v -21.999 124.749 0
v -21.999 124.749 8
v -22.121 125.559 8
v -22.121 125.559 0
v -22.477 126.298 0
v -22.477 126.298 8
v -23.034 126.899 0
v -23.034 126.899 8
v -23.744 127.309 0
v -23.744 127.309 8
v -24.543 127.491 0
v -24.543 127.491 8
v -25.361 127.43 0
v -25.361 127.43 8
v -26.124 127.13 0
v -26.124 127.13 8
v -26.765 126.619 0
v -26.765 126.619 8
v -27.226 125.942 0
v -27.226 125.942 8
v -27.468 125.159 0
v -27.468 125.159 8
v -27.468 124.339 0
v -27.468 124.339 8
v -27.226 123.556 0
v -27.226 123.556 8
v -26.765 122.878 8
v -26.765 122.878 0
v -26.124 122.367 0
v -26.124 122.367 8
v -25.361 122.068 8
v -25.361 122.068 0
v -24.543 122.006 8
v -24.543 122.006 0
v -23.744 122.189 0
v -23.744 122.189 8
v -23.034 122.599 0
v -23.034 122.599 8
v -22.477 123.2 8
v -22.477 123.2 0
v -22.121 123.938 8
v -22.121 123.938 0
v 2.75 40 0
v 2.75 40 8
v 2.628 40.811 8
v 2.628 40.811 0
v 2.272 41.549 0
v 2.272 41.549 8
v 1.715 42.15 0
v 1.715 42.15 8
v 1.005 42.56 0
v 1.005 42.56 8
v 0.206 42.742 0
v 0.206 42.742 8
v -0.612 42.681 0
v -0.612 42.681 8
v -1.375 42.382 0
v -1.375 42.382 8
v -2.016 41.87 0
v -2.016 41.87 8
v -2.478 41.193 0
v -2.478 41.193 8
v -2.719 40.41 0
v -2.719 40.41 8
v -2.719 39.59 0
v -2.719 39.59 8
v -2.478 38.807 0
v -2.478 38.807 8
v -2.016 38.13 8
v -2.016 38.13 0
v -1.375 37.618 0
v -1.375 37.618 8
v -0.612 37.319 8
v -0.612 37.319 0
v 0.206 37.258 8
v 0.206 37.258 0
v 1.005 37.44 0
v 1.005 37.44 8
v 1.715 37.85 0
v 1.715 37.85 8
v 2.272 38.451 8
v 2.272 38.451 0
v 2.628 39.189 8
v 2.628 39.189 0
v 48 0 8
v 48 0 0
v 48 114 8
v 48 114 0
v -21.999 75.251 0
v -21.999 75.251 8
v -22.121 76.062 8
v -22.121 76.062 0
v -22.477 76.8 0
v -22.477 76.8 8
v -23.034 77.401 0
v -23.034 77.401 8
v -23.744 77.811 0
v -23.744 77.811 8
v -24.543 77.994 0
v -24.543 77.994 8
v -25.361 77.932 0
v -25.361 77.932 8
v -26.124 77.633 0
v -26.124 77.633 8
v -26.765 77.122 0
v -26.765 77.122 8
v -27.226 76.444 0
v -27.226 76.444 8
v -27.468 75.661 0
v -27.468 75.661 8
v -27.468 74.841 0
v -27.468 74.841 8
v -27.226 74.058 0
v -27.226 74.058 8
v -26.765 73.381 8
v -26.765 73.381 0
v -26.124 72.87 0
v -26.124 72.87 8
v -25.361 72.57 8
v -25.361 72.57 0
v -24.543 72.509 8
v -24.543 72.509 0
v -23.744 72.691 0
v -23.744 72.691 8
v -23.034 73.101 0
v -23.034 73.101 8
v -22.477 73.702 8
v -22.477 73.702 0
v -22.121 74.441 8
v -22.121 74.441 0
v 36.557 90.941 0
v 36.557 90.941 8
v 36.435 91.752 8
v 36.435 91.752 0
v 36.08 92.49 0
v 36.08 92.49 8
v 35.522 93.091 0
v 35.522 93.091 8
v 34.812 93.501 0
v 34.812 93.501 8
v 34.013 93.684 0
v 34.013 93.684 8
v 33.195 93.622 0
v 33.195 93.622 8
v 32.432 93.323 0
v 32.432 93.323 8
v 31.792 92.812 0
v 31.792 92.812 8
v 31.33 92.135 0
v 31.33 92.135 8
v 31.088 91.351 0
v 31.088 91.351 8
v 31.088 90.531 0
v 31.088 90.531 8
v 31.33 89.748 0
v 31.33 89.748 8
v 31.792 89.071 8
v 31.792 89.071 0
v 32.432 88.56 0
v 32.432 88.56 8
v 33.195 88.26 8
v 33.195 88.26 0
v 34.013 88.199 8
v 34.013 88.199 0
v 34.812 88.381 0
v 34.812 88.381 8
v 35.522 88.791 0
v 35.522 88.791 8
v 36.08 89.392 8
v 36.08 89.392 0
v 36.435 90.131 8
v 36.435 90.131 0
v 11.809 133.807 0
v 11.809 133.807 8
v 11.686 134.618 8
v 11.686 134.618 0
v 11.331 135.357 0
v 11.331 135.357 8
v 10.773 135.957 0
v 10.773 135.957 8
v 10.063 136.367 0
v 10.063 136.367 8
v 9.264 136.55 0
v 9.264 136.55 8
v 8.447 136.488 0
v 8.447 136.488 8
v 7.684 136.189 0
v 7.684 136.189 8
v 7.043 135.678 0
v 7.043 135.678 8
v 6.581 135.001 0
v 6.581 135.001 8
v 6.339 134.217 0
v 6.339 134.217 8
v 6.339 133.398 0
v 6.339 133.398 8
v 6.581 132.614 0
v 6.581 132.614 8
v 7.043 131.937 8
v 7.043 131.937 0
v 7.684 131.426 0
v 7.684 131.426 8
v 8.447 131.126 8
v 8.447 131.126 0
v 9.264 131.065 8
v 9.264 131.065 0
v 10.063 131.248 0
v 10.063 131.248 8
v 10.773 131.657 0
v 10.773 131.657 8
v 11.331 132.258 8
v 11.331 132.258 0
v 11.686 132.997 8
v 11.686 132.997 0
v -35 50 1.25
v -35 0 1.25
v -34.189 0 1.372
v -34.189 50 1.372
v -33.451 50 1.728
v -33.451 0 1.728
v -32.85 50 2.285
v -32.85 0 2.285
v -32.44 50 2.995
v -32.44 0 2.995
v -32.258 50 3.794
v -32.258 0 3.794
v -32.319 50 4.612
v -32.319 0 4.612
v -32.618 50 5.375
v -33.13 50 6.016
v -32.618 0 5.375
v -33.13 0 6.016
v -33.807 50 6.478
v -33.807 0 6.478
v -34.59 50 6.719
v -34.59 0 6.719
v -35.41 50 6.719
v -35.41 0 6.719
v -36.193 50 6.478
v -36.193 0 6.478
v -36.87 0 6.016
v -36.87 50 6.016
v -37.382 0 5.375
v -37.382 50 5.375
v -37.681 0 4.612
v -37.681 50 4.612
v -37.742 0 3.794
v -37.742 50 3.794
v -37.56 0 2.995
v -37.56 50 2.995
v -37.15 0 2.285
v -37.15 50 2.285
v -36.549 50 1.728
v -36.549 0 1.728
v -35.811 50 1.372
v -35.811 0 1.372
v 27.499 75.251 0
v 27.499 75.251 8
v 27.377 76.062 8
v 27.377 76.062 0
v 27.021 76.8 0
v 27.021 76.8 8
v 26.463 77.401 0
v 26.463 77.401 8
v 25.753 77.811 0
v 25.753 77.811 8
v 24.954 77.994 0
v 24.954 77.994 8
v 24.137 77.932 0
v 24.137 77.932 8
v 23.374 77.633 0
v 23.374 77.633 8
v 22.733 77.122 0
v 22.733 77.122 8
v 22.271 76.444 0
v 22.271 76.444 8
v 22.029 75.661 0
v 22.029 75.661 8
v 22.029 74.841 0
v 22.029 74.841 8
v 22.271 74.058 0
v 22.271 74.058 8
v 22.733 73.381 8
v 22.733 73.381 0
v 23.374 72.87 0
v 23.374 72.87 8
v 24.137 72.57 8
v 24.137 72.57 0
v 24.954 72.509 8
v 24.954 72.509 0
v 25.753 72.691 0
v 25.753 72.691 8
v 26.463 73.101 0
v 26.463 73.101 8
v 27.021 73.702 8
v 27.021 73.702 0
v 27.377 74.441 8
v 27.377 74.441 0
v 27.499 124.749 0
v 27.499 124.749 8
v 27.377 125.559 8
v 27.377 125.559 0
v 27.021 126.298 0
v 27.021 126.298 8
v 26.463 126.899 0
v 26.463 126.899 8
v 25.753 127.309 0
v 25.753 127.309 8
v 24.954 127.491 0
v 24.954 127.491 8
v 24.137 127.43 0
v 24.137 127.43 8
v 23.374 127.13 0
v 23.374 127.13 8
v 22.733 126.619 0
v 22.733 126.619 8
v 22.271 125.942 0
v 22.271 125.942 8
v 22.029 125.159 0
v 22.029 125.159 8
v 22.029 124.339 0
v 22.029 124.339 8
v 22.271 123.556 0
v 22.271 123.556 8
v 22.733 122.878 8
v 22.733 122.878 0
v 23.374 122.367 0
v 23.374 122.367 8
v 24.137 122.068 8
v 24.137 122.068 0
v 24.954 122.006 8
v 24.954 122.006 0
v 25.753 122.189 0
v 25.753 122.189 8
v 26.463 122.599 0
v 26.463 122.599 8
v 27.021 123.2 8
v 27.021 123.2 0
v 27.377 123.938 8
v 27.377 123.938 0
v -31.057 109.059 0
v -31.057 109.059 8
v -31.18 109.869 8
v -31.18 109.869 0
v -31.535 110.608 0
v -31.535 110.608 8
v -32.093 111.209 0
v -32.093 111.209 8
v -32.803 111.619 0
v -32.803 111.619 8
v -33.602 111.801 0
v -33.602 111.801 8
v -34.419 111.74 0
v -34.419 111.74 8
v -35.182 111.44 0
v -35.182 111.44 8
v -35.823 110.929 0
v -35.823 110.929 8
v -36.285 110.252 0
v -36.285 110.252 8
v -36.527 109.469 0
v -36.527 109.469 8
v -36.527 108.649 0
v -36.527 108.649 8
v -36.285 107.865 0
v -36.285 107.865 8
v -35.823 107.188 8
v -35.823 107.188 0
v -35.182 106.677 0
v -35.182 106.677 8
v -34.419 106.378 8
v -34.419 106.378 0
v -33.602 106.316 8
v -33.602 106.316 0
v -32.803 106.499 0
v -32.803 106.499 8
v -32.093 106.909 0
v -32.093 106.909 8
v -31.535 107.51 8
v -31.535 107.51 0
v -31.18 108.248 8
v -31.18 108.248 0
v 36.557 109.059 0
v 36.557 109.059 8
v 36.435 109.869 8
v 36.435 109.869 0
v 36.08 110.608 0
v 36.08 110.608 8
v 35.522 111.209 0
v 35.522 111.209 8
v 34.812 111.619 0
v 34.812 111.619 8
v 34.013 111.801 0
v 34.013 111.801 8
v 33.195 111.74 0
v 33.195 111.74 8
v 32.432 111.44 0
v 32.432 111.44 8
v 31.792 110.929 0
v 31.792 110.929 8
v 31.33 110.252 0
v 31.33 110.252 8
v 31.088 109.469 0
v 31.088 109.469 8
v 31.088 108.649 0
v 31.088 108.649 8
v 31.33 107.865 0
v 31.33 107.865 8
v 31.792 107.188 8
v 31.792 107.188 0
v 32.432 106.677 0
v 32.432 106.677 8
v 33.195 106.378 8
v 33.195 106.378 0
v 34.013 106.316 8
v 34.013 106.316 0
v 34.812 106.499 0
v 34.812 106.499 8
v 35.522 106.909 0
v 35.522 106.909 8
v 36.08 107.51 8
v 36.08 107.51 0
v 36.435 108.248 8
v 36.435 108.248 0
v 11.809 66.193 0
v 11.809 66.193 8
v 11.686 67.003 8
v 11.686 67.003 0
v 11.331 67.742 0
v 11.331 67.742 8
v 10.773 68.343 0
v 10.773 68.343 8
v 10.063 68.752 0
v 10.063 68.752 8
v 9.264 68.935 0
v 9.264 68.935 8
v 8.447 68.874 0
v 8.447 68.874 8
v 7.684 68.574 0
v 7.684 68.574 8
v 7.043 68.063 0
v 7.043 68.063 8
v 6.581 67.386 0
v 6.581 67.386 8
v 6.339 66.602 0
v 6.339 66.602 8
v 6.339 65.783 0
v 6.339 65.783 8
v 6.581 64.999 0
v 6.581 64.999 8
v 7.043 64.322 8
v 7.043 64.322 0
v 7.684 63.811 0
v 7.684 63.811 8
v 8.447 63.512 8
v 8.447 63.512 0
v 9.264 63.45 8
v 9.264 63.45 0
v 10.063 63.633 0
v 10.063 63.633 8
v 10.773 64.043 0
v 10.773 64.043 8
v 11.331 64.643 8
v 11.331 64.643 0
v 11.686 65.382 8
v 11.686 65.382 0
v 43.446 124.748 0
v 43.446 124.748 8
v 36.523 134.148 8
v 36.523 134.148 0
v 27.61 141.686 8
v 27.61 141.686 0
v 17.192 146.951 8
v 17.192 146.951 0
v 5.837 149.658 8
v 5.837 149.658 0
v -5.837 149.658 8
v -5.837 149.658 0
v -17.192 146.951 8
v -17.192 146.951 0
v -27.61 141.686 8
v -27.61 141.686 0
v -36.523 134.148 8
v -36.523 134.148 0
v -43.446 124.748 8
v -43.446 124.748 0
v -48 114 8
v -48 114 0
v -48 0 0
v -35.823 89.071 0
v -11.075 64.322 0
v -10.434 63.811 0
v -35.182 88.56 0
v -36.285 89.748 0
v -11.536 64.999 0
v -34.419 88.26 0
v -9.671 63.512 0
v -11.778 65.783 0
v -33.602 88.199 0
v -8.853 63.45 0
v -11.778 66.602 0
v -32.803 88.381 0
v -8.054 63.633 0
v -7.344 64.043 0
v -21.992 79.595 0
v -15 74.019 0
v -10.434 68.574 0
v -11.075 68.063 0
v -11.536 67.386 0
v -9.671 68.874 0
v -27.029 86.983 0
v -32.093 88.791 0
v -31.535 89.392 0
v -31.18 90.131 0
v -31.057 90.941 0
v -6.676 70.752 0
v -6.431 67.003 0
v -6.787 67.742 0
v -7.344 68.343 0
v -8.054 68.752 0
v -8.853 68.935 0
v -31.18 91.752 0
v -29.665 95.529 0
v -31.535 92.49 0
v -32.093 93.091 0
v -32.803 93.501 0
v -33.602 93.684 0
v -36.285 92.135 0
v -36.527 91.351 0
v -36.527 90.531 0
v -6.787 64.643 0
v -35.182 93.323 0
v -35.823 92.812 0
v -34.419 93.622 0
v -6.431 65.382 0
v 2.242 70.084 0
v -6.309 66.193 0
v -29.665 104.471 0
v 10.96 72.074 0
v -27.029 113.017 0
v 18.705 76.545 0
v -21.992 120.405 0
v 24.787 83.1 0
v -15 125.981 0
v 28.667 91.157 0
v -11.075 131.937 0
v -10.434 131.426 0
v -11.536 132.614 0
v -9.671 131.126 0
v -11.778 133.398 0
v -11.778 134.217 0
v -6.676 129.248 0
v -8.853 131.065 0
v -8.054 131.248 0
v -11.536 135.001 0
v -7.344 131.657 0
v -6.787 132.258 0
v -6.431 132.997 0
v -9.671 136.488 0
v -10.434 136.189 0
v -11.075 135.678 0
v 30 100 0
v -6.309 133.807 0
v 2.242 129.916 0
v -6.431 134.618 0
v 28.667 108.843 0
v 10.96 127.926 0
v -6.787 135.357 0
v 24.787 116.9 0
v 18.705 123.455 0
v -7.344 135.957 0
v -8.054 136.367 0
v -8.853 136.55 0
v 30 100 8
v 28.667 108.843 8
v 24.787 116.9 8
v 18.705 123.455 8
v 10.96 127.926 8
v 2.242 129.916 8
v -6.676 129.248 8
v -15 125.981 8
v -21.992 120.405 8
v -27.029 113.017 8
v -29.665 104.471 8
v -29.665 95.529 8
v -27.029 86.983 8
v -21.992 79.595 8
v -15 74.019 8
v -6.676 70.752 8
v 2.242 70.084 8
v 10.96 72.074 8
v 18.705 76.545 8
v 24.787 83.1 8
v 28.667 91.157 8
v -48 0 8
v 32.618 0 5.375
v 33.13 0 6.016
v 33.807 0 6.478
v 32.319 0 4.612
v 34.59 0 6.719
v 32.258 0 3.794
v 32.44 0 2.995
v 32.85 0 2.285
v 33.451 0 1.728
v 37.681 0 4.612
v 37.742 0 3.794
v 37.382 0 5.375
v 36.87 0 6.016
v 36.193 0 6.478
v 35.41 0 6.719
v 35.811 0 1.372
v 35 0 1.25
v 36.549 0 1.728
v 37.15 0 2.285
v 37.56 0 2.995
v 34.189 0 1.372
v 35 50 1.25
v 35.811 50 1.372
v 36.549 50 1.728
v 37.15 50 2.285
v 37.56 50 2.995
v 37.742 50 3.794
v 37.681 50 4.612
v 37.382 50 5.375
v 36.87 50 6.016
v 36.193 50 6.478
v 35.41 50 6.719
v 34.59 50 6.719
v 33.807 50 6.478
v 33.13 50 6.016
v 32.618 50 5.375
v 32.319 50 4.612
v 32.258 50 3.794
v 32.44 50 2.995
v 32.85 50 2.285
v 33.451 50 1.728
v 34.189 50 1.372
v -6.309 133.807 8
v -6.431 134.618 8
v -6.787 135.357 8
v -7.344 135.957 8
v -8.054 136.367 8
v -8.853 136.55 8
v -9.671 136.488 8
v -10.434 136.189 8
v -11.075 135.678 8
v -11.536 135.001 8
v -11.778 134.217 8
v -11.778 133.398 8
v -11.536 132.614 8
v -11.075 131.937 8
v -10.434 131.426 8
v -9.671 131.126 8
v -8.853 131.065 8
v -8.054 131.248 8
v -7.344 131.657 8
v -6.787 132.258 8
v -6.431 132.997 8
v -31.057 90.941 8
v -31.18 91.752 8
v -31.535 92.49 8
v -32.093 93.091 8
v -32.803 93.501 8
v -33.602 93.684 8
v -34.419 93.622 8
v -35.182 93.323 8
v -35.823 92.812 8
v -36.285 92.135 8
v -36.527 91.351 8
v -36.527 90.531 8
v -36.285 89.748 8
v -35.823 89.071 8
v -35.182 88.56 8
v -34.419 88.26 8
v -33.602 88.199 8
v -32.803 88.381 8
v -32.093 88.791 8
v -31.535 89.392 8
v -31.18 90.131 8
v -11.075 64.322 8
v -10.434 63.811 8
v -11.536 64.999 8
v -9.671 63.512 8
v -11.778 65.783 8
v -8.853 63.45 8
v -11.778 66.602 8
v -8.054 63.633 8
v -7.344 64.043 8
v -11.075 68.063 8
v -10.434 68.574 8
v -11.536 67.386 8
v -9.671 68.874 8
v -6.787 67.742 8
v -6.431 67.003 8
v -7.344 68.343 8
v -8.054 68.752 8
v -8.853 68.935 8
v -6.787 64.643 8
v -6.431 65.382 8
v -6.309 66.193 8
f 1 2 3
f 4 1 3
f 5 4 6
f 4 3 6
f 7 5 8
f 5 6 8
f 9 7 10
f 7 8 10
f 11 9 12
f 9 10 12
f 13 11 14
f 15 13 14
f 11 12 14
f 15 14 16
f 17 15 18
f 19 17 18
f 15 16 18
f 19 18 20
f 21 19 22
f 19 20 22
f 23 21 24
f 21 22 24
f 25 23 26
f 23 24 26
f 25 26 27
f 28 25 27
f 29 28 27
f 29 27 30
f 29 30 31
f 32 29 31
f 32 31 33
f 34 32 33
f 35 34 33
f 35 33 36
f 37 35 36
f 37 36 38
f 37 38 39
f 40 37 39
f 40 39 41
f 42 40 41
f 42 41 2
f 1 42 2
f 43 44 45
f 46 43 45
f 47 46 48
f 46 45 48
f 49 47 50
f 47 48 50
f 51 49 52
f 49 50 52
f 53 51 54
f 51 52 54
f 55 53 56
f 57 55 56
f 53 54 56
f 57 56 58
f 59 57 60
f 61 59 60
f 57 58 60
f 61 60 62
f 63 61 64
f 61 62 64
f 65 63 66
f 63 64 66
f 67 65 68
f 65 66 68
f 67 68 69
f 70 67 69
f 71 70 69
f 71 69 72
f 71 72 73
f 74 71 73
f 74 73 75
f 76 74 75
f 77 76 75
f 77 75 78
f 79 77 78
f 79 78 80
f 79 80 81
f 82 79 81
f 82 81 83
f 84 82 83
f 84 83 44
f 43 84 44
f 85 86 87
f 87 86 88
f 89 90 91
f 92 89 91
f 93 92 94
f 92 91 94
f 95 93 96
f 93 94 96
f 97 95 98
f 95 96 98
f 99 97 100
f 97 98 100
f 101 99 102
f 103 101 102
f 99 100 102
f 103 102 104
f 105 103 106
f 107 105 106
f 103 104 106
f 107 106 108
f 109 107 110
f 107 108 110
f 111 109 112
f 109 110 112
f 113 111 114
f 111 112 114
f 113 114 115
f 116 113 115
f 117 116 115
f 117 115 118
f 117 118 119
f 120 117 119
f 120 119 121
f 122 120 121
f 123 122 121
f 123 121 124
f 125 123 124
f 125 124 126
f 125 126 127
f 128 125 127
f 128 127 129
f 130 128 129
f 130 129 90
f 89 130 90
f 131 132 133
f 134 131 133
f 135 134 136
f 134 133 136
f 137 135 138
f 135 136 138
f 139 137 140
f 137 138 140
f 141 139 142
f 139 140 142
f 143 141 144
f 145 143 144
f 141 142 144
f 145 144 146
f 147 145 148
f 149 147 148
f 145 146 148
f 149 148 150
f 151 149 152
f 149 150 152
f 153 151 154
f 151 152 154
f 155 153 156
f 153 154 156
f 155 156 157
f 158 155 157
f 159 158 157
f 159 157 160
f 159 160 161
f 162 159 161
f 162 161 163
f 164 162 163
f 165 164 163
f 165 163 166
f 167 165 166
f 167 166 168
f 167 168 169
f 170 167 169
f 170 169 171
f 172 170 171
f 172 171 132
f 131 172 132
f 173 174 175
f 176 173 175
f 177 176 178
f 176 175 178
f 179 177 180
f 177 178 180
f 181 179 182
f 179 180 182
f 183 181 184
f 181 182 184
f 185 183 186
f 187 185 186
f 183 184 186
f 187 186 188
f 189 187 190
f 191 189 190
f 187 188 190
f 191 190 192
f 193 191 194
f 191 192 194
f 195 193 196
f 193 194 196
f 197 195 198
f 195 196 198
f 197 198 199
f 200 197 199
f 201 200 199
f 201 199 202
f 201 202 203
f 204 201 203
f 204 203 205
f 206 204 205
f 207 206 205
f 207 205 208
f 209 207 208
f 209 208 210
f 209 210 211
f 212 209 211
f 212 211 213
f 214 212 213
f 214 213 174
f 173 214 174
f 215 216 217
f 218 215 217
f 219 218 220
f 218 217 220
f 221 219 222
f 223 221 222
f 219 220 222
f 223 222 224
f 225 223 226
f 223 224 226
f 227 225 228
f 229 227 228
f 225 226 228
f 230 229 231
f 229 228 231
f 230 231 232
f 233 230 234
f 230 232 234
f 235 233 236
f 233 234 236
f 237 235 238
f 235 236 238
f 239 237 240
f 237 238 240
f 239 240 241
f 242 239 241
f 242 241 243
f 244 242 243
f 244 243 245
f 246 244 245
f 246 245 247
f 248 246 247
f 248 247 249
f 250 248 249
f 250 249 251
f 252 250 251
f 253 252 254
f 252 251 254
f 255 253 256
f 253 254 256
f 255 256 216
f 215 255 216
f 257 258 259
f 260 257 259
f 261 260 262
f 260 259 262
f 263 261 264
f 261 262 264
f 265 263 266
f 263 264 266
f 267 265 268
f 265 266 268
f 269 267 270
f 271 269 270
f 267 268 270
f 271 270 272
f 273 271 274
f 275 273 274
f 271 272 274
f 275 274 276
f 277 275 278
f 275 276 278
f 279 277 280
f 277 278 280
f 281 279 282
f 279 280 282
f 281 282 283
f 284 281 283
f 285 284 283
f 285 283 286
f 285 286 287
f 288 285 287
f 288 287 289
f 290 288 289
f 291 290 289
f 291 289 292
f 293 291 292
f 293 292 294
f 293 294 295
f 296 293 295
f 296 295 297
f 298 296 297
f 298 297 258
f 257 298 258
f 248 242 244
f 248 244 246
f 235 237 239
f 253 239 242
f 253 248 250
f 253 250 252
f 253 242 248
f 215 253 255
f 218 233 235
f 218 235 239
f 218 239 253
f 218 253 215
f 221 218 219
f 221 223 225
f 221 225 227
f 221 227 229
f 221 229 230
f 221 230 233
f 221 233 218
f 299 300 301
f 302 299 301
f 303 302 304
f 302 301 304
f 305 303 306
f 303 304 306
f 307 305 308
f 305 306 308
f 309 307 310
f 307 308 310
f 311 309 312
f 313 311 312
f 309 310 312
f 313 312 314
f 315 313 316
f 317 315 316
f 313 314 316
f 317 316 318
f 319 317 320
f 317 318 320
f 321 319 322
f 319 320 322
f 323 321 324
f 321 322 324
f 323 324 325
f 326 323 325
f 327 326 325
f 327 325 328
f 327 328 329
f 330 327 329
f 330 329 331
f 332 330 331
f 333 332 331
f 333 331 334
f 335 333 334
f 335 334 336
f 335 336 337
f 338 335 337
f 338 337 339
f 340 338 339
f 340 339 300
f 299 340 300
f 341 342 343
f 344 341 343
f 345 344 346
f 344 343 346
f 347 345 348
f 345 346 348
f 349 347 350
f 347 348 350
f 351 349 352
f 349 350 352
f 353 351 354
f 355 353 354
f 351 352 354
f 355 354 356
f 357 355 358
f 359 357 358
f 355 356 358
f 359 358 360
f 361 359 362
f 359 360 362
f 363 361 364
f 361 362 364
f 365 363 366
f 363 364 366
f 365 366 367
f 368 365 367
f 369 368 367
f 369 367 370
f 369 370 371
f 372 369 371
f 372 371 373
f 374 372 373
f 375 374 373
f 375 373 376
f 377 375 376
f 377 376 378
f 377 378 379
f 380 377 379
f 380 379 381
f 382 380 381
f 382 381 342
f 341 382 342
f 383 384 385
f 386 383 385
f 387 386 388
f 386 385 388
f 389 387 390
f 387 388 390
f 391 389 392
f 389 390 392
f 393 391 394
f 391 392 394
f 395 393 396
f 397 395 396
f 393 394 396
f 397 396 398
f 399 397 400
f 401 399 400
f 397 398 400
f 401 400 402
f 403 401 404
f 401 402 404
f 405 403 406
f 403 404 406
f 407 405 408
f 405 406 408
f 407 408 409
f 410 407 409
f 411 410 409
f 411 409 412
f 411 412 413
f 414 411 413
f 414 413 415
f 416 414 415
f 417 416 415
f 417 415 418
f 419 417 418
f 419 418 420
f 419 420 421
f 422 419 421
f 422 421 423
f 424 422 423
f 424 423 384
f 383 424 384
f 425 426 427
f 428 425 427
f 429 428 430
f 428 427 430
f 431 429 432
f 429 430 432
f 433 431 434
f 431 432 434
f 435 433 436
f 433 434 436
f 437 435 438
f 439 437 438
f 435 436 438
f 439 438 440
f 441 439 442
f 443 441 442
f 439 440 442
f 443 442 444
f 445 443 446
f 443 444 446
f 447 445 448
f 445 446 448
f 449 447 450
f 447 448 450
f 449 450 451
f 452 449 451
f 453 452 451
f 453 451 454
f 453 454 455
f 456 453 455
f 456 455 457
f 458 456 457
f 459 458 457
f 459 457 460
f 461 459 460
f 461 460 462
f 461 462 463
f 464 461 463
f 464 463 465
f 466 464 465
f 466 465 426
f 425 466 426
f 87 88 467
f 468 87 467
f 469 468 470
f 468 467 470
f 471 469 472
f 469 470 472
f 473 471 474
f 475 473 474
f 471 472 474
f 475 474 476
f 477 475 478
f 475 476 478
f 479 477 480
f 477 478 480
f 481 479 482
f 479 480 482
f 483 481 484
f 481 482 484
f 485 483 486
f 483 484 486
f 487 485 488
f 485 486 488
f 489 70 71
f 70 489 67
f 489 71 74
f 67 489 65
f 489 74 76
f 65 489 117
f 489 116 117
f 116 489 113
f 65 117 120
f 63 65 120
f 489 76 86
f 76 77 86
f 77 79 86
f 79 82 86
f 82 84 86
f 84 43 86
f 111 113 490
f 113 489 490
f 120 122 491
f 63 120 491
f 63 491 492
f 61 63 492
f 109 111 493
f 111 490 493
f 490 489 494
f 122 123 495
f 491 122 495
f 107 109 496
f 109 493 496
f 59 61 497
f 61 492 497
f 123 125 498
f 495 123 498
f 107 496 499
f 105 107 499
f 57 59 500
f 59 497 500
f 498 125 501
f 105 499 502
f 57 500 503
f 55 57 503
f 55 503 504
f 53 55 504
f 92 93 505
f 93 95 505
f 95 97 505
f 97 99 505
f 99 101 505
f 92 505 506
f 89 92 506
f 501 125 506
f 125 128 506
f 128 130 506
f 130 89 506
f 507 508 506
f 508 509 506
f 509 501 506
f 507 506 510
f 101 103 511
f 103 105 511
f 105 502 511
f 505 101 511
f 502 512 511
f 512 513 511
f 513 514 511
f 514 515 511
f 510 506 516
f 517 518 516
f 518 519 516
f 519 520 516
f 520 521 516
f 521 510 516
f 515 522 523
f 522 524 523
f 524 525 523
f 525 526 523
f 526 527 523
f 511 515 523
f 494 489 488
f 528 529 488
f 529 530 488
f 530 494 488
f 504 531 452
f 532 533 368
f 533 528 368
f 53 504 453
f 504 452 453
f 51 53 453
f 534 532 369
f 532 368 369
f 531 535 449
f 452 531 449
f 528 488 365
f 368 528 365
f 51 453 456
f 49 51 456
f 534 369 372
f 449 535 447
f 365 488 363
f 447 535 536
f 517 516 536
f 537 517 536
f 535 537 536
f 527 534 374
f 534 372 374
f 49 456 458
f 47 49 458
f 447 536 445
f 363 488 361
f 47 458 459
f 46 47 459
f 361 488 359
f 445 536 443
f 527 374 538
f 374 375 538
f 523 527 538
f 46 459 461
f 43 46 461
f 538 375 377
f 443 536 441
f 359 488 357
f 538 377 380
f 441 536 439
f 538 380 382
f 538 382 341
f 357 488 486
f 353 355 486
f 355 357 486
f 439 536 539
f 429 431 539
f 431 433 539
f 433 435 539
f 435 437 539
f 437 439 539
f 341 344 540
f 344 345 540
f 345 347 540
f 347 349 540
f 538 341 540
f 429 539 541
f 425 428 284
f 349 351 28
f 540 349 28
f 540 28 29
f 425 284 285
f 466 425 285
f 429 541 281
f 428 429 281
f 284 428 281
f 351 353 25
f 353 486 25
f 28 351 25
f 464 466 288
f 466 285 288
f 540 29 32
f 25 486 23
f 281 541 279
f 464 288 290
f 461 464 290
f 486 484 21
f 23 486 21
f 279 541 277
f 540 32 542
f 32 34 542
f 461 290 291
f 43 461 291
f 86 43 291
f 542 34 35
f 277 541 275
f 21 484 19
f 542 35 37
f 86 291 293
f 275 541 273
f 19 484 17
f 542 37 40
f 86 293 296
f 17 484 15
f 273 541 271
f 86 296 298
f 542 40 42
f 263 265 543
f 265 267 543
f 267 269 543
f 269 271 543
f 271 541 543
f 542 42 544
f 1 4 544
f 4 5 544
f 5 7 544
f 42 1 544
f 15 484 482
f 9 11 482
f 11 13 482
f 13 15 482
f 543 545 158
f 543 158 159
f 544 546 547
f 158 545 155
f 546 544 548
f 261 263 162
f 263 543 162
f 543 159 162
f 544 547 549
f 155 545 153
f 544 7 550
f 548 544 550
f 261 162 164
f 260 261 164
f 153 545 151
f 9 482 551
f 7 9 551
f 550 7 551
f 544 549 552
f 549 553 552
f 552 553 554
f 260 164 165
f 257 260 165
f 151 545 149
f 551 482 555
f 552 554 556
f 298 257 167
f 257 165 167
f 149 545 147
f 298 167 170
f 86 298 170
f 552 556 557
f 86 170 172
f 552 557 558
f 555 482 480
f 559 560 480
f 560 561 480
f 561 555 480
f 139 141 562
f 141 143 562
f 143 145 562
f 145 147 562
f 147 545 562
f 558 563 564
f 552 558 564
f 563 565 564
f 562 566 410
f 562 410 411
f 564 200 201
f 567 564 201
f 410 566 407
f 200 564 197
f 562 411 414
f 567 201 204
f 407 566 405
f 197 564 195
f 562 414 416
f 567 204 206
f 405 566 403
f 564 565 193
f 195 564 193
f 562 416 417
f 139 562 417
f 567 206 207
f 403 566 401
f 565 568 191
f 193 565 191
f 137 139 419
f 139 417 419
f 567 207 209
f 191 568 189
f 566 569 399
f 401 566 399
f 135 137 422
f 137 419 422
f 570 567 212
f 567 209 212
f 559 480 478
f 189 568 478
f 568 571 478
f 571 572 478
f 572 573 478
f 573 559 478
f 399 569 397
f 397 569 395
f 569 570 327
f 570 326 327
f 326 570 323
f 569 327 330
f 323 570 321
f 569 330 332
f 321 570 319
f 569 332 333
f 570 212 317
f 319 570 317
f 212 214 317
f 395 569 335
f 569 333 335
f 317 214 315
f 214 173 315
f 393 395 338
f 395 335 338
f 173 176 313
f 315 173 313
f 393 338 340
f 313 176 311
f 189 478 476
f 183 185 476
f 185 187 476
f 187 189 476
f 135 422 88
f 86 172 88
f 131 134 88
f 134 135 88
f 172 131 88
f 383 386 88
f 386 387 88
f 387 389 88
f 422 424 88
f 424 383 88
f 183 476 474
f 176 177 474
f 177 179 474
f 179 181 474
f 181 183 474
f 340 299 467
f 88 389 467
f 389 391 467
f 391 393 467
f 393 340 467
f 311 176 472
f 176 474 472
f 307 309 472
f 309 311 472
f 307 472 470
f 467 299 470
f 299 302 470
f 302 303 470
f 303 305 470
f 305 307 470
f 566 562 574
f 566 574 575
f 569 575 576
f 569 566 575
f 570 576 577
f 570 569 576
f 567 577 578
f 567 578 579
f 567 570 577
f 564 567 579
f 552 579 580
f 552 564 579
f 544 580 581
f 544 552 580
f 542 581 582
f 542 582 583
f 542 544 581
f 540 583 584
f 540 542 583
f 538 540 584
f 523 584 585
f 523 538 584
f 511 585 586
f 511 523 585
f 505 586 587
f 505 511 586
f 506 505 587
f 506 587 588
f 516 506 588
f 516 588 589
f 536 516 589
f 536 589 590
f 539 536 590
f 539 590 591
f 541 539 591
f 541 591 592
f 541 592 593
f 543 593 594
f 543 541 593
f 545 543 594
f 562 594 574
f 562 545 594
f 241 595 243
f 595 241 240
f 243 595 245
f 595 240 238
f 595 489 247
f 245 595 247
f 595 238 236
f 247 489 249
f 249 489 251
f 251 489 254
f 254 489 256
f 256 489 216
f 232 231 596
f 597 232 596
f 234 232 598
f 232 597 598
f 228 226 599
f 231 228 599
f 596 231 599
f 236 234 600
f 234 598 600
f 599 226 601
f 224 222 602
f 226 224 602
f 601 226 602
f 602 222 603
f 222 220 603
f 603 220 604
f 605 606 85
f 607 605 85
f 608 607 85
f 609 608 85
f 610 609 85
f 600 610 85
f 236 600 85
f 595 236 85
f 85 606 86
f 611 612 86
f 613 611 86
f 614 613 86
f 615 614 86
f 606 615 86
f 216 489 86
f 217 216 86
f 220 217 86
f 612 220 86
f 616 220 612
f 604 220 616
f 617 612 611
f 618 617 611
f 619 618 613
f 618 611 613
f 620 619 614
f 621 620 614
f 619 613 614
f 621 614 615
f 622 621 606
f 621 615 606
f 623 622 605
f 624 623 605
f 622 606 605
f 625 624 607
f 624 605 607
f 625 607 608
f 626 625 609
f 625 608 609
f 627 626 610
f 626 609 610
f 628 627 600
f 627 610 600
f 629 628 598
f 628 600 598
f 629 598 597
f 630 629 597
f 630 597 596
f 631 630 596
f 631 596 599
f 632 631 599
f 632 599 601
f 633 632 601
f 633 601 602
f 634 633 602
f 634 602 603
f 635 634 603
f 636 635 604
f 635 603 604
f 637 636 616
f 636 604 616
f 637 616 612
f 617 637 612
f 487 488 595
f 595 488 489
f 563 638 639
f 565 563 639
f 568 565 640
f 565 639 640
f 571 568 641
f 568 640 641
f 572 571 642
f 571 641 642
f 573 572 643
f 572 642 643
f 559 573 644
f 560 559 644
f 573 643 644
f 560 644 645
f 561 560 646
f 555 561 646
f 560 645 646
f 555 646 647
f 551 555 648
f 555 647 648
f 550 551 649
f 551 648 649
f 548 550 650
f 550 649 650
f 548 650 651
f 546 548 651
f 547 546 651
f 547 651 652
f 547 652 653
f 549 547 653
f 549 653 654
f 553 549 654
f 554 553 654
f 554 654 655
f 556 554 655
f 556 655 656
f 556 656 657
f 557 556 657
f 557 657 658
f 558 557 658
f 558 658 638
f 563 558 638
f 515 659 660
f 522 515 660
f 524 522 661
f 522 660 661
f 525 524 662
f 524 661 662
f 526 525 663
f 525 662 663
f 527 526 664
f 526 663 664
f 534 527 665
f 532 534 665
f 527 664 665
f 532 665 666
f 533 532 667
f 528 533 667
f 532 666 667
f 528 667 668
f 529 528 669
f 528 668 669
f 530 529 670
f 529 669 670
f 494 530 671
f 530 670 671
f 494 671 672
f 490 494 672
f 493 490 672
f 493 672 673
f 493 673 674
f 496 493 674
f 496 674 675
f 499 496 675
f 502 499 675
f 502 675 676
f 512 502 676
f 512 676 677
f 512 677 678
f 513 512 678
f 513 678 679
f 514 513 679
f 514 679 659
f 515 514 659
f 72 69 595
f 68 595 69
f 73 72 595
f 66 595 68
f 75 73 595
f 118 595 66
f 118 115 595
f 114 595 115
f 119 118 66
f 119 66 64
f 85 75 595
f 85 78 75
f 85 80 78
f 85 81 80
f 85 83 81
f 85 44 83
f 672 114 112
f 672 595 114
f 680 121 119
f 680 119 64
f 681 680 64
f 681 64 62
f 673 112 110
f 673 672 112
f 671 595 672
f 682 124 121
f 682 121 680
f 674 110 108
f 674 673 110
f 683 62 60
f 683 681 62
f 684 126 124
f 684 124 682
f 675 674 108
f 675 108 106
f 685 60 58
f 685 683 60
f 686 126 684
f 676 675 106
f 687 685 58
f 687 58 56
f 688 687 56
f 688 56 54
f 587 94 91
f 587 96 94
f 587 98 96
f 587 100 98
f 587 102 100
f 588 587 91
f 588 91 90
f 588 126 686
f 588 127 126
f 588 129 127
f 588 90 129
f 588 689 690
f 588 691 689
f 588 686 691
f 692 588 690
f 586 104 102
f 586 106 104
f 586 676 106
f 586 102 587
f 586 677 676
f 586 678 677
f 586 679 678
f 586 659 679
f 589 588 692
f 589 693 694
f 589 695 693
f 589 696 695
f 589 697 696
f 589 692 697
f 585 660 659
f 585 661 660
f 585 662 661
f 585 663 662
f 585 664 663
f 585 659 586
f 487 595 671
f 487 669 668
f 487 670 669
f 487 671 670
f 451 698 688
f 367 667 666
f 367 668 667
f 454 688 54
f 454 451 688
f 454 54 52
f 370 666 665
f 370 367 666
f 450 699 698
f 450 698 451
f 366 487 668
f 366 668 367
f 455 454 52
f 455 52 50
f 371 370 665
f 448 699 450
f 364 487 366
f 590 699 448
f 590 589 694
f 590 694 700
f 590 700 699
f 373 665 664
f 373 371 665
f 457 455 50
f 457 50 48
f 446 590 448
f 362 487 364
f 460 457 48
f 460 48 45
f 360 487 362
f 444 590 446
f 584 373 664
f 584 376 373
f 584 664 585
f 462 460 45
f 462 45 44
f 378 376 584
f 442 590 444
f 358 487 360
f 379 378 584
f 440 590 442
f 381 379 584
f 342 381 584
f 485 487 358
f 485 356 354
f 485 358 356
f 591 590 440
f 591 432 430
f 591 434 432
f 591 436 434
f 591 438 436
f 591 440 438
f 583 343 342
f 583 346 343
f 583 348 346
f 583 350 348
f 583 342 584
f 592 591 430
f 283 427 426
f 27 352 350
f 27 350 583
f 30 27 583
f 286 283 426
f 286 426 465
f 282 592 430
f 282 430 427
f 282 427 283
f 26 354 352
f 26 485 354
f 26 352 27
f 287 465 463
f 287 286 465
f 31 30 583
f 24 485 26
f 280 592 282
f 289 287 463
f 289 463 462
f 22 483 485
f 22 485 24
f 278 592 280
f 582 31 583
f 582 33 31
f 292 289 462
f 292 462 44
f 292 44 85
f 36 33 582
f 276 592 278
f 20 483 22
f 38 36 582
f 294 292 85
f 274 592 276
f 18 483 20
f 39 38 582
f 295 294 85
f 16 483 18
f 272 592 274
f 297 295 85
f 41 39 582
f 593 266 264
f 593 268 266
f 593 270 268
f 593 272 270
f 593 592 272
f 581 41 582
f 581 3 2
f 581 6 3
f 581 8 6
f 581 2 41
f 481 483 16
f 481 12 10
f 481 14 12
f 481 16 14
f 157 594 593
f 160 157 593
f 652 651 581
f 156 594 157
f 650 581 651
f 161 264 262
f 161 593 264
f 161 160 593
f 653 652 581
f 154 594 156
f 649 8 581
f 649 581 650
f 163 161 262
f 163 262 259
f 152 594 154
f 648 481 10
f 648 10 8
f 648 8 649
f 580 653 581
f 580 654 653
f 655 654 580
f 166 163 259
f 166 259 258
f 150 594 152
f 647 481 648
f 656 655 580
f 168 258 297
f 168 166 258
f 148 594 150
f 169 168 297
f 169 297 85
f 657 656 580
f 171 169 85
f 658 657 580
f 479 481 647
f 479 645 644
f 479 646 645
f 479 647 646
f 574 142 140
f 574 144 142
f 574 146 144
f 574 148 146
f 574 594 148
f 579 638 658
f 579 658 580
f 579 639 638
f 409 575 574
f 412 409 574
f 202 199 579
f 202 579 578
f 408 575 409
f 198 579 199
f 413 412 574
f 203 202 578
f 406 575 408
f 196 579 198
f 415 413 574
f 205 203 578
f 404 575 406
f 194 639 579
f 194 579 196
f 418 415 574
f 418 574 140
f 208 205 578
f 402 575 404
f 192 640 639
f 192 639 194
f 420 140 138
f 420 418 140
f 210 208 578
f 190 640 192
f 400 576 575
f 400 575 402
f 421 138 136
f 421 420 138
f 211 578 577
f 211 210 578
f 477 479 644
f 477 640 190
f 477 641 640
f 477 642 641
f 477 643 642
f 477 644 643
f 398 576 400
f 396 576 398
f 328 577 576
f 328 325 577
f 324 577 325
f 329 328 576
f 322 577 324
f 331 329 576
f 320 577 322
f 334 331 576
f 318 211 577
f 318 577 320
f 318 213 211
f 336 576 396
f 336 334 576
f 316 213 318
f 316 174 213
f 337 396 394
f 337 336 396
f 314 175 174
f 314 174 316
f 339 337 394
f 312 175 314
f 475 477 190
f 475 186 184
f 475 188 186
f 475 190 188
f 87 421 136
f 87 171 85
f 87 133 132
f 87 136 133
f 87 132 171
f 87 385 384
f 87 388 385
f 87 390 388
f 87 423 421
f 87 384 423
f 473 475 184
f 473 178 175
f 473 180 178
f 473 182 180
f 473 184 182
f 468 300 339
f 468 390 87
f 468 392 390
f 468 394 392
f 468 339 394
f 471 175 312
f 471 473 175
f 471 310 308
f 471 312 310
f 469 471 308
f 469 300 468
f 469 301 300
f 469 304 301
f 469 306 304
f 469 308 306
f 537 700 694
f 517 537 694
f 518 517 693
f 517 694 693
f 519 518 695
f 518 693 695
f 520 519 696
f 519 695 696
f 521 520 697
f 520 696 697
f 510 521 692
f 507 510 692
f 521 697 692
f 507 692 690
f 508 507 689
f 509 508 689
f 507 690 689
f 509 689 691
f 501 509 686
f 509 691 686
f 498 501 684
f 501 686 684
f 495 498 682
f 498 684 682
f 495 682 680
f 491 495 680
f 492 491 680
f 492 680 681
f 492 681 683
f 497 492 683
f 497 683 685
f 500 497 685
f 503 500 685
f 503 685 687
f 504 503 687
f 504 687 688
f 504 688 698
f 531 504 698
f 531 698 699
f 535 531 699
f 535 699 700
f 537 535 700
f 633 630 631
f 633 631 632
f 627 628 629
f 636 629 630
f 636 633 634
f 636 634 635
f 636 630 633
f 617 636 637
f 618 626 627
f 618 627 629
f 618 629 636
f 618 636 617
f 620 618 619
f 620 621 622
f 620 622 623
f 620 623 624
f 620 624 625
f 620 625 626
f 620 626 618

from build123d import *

# Parameters (mm, degrees)
SKETCH_1_R          = 30
EXTRUDE_1_DEPTH     = 8
SKETCH_2_R          = 2.75
CUT_EXTRUDE_1_DEPTH = 50
SKETCH_3_R          = 2.75
CUT_EXTRUDE_2_DEPTH = 20
SKETCH_4_R          = 2.75
CUT_EXTRUDE_3_DEPTH = 10


with BuildPart() as part:
    # 草图1 → 凸台-拉伸1 (new body)
    with BuildSketch(Plane.XY):
        with BuildLine():
            Line((-48, 114), (-48, 0))
            Line((-48, 0), (48, 0))
            Line((48, 0), (48, 114))
            ThreePointArc((48, 114), (0, 150), (-48, 114))
        make_face()
        with Locations((0, 100)):
            Circle(SKETCH_1_R, mode=Mode.SUBTRACT)
    extrude(amount=EXTRUDE_1_DEPTH)

    # 草图2 → 切除-拉伸1 (cut)
    with BuildSketch(Plane.XZ):
        with Locations(Location((35, 4, 0), (0, 0, 270))):
            Circle(SKETCH_2_R)
        with Locations(Location((-35, 4, 0), (0, 0, 270))):
            Circle(SKETCH_2_R)
    extrude(amount=-CUT_EXTRUDE_1_DEPTH, mode=Mode.SUBTRACT)

    # 草图3 → 切除-拉伸2 (cut)
    with BuildSketch(Plane.XY.offset(8)):
        with Locations((0, 40)):
            Circle(SKETCH_3_R)
    extrude(amount=-CUT_EXTRUDE_2_DEPTH, mode=Mode.SUBTRACT)

    # 草图4 → 切除-拉伸3 (cut)
    with BuildSketch(Plane.XY.offset(8)):
        with Locations((9.058666579, 133.80740392)):
            Circle(SKETCH_4_R)
        with Locations((24.748737342, 124.748737342)):
            Circle(SKETCH_4_R)
        with Locations((33.80740392, 109.058666579)):
            Circle(SKETCH_4_R)
        with Locations((33.80740392, 90.941333421)):
            Circle(SKETCH_4_R)
        with Locations((24.748737342, 75.251262658)):
            Circle(SKETCH_4_R)
        with Locations((9.058666579, 66.19259608)):
            Circle(SKETCH_4_R)
        with Locations((-9.058666579, 66.19259608)):
            Circle(SKETCH_4_R)
        with Locations((-24.748737342, 75.251262658)):
            Circle(SKETCH_4_R)
        with Locations((-33.80740392, 90.941333421)):
            Circle(SKETCH_4_R)
        with Locations((-33.80740392, 109.058666579)):
            Circle(SKETCH_4_R)
        with Locations((-24.748737342, 124.748737342)):
            Circle(SKETCH_4_R)
        with Locations((-9.058666579, 133.80740392)):
            Circle(SKETCH_4_R)
    extrude(amount=-CUT_EXTRUDE_3_DEPTH, mode=Mode.SUBTRACT)


solid = part.part
